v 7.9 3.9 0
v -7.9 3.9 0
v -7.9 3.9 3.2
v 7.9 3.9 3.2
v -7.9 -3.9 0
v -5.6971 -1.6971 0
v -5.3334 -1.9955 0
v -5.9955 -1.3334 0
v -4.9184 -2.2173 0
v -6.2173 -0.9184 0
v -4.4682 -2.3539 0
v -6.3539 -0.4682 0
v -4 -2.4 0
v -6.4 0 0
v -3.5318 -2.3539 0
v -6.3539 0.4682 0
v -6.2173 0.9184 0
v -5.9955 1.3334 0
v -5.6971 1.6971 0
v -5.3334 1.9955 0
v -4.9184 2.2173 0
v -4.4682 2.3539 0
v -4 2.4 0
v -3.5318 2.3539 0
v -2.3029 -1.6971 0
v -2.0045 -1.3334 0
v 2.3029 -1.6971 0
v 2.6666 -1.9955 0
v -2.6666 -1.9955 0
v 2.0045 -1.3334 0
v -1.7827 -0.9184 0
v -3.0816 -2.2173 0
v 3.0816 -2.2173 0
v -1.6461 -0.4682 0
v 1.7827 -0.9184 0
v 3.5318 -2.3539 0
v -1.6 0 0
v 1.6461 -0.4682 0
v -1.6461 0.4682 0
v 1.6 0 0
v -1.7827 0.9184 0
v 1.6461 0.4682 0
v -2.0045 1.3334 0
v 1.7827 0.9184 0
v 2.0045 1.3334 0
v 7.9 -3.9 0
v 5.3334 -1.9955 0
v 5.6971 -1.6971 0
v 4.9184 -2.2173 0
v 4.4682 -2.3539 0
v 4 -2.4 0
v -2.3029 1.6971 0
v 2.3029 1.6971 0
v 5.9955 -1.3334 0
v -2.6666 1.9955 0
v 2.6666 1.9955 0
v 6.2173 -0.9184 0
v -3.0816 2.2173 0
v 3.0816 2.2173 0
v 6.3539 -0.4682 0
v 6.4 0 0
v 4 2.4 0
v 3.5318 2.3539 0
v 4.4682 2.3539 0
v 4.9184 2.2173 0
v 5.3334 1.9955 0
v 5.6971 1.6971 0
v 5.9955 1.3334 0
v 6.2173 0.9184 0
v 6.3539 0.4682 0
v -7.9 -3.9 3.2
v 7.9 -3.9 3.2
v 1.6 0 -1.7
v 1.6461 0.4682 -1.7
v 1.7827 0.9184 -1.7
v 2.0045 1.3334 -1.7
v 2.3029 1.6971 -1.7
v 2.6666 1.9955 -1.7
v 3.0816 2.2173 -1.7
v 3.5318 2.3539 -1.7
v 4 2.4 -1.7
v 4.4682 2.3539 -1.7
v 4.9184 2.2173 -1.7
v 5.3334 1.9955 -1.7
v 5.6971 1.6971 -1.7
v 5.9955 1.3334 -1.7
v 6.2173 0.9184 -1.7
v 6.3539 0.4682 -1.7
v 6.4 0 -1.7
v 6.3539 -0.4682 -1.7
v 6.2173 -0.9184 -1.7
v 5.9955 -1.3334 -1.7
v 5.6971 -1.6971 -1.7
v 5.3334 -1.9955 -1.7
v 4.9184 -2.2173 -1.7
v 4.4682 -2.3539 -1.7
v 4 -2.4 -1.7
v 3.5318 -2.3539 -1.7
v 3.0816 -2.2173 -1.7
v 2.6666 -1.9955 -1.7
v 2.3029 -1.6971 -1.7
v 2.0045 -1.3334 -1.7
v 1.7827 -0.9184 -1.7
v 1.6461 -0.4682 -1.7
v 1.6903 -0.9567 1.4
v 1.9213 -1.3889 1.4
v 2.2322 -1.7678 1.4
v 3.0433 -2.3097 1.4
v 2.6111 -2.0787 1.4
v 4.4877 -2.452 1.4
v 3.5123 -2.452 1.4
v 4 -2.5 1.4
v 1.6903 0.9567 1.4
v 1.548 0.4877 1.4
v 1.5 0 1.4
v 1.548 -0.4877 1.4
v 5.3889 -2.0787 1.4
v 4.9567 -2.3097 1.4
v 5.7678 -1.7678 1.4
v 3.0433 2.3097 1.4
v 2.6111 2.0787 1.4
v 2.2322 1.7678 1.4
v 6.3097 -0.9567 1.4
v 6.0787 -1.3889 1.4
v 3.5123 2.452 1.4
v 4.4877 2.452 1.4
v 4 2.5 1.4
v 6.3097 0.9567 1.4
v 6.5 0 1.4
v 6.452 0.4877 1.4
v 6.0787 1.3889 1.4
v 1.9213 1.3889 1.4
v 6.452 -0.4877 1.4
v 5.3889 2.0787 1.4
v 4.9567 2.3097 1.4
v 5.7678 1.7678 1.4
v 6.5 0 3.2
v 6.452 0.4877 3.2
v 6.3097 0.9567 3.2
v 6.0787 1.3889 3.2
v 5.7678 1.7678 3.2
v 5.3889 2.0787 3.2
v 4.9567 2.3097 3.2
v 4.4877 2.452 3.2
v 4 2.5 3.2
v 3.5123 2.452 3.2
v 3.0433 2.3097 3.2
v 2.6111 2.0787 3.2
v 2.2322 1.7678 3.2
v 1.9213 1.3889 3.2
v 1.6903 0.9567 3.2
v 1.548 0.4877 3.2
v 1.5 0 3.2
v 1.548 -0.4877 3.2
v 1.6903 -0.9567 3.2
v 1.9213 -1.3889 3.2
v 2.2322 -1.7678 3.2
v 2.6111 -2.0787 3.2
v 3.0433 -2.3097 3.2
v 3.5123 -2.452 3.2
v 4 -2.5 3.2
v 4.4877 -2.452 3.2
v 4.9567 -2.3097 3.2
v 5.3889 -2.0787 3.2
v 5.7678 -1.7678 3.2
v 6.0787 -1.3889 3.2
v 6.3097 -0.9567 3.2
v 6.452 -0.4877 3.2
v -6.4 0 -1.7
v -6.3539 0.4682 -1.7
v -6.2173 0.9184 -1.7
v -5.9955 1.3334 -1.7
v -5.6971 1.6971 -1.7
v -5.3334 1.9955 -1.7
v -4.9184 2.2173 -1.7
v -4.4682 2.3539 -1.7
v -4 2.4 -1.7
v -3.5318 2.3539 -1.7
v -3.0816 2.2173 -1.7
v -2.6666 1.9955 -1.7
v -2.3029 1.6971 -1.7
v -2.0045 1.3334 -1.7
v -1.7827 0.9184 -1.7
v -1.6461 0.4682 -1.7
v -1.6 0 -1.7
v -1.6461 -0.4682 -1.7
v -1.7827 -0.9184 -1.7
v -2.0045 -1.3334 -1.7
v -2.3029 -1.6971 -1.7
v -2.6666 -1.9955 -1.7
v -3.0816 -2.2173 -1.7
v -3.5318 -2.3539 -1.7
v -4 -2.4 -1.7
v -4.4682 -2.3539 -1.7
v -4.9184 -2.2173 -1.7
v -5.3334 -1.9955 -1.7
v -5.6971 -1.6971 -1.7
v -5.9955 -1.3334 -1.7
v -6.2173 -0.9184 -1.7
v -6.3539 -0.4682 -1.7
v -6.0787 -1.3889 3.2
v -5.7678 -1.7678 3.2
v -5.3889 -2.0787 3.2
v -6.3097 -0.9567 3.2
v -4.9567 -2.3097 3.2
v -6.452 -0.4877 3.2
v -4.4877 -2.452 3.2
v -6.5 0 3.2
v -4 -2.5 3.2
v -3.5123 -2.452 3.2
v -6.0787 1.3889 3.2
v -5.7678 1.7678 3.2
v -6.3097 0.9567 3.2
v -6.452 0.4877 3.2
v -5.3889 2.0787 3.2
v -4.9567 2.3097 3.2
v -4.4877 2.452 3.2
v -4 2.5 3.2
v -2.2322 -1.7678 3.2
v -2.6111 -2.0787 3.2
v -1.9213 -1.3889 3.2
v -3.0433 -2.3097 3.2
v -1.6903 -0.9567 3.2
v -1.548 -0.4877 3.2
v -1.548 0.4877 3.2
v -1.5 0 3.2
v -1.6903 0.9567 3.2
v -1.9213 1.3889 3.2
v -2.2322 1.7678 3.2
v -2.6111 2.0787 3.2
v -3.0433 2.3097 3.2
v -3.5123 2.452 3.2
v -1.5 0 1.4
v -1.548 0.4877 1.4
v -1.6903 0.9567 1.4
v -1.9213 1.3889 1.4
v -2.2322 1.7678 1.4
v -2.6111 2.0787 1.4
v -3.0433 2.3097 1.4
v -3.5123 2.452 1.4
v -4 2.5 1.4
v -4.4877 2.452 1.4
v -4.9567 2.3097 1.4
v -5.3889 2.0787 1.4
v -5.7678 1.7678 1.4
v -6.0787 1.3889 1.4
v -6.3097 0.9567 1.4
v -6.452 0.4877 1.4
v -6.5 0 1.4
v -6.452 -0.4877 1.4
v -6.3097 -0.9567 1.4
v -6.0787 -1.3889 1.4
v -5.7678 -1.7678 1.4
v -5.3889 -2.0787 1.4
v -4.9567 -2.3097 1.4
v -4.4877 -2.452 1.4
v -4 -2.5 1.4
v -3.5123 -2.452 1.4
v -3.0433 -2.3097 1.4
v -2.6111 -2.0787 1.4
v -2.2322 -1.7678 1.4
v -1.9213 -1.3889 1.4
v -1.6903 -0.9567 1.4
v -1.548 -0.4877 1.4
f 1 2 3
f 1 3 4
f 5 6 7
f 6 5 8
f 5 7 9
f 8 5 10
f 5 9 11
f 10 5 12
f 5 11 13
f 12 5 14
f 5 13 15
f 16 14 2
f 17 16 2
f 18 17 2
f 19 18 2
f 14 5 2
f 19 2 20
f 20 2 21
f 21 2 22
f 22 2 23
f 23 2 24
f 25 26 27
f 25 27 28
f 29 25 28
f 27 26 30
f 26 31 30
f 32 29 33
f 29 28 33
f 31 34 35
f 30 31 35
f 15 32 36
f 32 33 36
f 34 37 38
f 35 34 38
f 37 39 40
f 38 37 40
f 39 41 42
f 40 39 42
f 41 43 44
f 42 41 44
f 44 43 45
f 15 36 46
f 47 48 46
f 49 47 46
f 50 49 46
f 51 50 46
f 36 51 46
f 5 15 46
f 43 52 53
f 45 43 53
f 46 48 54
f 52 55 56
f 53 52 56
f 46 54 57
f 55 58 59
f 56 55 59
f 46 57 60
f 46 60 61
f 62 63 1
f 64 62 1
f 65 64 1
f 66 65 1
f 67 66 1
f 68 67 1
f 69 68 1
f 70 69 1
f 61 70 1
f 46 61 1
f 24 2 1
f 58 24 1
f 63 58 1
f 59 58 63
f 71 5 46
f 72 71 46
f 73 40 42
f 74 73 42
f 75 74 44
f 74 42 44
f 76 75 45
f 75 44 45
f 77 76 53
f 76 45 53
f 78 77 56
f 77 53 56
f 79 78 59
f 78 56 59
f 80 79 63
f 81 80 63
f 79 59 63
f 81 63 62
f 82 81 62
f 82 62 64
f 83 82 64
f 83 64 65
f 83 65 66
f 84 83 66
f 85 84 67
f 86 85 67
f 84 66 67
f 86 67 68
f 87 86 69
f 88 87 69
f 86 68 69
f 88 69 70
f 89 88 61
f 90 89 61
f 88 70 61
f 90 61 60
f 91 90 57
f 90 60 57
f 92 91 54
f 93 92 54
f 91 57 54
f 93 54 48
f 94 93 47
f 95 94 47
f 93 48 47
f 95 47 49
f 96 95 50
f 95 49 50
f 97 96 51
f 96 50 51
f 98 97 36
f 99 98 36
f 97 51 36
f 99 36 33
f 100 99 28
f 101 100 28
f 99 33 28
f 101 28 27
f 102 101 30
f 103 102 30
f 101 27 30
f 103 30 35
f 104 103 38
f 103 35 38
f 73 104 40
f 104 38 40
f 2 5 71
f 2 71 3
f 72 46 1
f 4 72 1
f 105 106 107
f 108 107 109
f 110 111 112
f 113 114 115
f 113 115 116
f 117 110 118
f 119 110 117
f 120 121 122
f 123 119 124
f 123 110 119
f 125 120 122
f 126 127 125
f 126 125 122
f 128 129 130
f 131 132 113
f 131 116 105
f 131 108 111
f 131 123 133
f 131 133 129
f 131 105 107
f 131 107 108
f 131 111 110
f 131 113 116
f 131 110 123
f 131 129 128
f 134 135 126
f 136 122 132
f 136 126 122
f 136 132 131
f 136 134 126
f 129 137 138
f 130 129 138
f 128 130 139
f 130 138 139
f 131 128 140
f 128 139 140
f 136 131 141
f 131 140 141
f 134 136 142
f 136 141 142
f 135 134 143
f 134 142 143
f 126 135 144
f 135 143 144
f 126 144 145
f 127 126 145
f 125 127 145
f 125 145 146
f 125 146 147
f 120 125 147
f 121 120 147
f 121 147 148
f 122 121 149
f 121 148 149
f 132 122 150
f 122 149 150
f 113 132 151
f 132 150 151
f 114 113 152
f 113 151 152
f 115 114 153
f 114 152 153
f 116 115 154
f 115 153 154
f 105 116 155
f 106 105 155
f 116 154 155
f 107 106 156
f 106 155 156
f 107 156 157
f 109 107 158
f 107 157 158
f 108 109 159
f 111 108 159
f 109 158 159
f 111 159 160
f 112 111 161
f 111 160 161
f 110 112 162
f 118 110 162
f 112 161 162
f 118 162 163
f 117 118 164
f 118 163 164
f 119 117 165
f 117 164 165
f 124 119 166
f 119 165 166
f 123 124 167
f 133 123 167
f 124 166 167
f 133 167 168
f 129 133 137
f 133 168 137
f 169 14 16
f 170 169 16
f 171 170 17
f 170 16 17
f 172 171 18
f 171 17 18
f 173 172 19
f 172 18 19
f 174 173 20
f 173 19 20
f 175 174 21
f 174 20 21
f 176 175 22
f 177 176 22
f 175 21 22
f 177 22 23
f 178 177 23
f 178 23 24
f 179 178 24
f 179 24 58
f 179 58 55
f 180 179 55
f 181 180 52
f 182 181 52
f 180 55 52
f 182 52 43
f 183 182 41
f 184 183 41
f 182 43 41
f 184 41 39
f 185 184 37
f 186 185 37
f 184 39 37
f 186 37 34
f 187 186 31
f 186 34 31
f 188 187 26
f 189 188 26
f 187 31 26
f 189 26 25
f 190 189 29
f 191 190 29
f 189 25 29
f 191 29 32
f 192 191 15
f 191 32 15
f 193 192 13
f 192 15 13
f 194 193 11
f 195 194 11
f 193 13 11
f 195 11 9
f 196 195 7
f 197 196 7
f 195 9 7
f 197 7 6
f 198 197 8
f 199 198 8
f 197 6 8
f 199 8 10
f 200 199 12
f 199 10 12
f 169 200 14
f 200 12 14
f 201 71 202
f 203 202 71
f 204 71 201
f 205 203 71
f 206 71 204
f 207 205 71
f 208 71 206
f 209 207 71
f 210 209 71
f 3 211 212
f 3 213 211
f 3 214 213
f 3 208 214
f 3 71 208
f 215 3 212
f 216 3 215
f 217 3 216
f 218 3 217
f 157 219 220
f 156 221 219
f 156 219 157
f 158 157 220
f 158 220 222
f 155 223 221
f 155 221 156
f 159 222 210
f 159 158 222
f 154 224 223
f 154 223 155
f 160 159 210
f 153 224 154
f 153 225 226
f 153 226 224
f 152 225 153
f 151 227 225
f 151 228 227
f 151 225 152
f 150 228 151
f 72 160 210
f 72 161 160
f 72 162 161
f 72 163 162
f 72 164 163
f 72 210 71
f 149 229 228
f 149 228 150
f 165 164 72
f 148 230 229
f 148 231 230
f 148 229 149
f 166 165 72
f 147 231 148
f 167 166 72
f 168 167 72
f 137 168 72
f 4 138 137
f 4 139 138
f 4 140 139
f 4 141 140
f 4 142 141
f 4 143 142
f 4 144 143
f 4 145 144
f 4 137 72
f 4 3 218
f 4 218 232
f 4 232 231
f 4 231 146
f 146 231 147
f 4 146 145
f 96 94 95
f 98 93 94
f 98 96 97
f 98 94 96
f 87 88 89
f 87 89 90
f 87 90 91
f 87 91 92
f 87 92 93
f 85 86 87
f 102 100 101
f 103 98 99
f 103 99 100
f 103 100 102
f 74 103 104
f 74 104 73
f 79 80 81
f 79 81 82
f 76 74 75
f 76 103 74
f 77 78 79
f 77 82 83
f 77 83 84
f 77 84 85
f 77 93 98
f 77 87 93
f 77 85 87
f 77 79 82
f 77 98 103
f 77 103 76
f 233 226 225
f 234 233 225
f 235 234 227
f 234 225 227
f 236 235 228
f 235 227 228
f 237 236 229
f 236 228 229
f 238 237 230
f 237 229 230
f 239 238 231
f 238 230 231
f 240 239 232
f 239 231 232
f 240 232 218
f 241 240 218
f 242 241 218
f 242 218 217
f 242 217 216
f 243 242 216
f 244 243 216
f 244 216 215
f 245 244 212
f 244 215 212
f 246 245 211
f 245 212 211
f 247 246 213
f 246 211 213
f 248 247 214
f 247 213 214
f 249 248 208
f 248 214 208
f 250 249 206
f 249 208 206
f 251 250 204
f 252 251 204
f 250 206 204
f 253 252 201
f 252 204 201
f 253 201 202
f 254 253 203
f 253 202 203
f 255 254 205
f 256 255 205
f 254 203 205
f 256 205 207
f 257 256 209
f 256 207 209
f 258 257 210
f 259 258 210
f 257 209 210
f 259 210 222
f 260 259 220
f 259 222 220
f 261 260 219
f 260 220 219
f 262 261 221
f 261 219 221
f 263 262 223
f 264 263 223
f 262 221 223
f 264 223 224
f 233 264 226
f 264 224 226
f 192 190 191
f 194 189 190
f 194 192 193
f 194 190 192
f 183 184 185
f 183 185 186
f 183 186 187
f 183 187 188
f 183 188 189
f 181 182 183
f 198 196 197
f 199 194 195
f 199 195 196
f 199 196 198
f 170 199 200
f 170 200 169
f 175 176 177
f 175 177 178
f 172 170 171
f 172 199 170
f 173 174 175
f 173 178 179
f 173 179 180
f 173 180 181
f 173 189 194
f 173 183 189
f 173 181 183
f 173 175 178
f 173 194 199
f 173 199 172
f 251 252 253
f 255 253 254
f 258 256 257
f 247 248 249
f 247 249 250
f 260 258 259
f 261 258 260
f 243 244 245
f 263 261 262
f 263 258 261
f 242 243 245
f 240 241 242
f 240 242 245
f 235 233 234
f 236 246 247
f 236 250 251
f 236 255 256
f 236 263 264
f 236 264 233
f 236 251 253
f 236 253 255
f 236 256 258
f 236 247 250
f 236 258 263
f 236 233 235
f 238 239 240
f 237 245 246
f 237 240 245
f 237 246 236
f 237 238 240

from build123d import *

# Parameters (mm, degrees)
SKETCH_1_W          = 15.8
SKETCH_1_H          = 7.8
EXTRUDE_1_DEPTH     = 3.2
SKETCH_2_R          = 2.4
EXTRUDE_2_DEPTH     = 1.7
SKETCH_3_R          = 2.5
CUT_EXTRUDE_1_DEPTH = 1.8


with BuildPart() as part:
    # Эскиз1 → Бобышка-Вытянуть1 (new body)
    with BuildSketch(Plane.XY):
        Rectangle(SKETCH_1_W, SKETCH_1_H)
    extrude(amount=EXTRUDE_1_DEPTH)

    # Эскиз2 → Бобышка-Вытянуть2 (add)
    with BuildSketch(Plane(origin=(0, 0, 0), x_dir=(-1, 0, 0), z_dir=(0, 0, -1))):
        with Locations((-4, 0)):
            Circle(SKETCH_2_R)
        with Locations((4, 0)):
            Circle(SKETCH_2_R)
    extrude(amount=EXTRUDE_2_DEPTH)

    # Эскиз3 → Вырез-Вытянуть1 (cut)
    with BuildSketch(Plane.XY.offset(3.2)):
        with Locations((-4, 0)):
            Circle(SKETCH_3_R)
        with Locations((4, 0)):
            Circle(SKETCH_3_R)
    extrude(amount=-CUT_EXTRUDE_1_DEPTH, mode=Mode.SUBTRACT)


solid = part.part
